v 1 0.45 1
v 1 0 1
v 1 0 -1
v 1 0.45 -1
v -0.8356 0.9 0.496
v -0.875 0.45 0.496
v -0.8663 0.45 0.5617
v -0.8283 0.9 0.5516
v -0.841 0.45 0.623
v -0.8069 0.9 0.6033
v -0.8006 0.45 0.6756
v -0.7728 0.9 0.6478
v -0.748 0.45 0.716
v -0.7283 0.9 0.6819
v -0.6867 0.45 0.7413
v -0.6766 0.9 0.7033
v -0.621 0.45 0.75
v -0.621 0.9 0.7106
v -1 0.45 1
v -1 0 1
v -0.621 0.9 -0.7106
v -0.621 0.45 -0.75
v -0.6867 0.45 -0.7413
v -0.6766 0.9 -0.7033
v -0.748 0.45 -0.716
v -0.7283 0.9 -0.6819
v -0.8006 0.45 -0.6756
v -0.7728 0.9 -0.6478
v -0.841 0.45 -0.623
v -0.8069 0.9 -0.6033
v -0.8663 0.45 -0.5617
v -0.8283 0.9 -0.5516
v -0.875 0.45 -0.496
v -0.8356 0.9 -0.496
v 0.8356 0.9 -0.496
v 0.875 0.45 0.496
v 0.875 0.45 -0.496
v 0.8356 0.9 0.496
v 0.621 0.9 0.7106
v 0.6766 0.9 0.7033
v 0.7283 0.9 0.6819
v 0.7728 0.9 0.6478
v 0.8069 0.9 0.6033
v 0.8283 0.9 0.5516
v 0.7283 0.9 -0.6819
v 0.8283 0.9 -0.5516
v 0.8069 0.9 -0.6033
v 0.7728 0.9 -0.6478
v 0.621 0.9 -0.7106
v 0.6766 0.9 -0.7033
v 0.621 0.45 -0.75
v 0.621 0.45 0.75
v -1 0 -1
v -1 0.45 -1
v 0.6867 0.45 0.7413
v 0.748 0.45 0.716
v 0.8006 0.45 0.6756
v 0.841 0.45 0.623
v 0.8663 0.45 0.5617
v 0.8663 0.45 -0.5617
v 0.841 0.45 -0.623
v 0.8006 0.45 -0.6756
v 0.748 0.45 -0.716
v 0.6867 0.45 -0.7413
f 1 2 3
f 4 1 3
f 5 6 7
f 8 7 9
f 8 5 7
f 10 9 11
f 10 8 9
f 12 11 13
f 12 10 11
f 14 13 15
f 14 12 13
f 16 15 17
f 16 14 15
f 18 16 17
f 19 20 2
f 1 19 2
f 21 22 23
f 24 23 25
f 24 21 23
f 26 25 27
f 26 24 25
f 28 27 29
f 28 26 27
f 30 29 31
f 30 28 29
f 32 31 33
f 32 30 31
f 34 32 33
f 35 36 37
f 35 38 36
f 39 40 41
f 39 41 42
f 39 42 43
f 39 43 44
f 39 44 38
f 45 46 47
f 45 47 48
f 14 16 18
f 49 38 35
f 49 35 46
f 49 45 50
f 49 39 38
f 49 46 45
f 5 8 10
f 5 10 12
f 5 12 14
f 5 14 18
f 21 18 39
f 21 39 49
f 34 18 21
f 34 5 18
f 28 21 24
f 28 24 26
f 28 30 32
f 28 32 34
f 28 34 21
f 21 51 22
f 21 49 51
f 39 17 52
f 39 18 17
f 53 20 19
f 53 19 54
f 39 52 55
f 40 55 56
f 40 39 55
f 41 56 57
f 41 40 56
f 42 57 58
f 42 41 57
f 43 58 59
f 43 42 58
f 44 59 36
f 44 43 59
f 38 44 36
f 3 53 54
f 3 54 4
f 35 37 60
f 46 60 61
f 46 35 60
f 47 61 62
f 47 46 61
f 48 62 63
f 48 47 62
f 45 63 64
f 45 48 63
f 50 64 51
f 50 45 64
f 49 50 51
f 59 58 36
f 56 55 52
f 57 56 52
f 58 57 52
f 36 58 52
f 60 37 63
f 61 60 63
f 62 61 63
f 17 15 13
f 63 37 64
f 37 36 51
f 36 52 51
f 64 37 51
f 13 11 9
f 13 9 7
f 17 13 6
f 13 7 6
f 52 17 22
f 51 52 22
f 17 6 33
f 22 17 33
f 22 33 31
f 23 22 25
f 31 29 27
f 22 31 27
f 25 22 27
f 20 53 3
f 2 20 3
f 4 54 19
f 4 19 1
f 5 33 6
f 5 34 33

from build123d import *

# Parameters (mm, degrees)
SKETCH1_W           = 2
SKETCH1_H           = 2
BOSS_EXTRUDE1_DEPTH = 0.45
BOSS_EXTRUDE2_DEPTH = 0.45
BOSS_EXTRUDE2_TAPER = 5


with BuildPart() as part:
    # Sketch1 → Boss-Extrude1 (new body)
    with BuildSketch(Plane(origin=(0, 0, 0), x_dir=(1, 0, 0), z_dir=(0, 1, 0))):
        Rectangle(SKETCH1_W, SKETCH1_H)
    extrude(amount=BOSS_EXTRUDE1_DEPTH)


with BuildPart() as body_2:
    # Sketch2 → Boss-Extrude2 (new body)
    with BuildSketch(Plane(origin=(0, 0.45, 0), x_dir=(1, 0, 0), z_dir=(0, 1, 0))):
        with BuildLine():
            ThreePointArc((-0.621, 0.75), (-0.800605122, 0.675605122), (-0.875, 0.496))
            Line((-0.875, 0.496), (-0.875, -0.496))
            ThreePointArc((-0.875, -0.496), (-0.800605122, -0.675605122), (-0.621, -0.75))
            Line((-0.621, -0.75), (0.621, -0.75))
            ThreePointArc((0.621, -0.75), (0.800605122, -0.675605122), (0.875, -0.496))
            Line((0.875, -0.496), (0.875, 0.496))
            ThreePointArc((0.875, 0.496), (0.800605122, 0.675605122), (0.621, 0.75))
            Line((0.621, 0.75), (-0.621, 0.75))
        make_face()
    extrude(amount=BOSS_EXTRUDE2_DEPTH, taper=BOSS_EXTRUDE2_TAPER)


solid = Compound([part.part, body_2.part])
